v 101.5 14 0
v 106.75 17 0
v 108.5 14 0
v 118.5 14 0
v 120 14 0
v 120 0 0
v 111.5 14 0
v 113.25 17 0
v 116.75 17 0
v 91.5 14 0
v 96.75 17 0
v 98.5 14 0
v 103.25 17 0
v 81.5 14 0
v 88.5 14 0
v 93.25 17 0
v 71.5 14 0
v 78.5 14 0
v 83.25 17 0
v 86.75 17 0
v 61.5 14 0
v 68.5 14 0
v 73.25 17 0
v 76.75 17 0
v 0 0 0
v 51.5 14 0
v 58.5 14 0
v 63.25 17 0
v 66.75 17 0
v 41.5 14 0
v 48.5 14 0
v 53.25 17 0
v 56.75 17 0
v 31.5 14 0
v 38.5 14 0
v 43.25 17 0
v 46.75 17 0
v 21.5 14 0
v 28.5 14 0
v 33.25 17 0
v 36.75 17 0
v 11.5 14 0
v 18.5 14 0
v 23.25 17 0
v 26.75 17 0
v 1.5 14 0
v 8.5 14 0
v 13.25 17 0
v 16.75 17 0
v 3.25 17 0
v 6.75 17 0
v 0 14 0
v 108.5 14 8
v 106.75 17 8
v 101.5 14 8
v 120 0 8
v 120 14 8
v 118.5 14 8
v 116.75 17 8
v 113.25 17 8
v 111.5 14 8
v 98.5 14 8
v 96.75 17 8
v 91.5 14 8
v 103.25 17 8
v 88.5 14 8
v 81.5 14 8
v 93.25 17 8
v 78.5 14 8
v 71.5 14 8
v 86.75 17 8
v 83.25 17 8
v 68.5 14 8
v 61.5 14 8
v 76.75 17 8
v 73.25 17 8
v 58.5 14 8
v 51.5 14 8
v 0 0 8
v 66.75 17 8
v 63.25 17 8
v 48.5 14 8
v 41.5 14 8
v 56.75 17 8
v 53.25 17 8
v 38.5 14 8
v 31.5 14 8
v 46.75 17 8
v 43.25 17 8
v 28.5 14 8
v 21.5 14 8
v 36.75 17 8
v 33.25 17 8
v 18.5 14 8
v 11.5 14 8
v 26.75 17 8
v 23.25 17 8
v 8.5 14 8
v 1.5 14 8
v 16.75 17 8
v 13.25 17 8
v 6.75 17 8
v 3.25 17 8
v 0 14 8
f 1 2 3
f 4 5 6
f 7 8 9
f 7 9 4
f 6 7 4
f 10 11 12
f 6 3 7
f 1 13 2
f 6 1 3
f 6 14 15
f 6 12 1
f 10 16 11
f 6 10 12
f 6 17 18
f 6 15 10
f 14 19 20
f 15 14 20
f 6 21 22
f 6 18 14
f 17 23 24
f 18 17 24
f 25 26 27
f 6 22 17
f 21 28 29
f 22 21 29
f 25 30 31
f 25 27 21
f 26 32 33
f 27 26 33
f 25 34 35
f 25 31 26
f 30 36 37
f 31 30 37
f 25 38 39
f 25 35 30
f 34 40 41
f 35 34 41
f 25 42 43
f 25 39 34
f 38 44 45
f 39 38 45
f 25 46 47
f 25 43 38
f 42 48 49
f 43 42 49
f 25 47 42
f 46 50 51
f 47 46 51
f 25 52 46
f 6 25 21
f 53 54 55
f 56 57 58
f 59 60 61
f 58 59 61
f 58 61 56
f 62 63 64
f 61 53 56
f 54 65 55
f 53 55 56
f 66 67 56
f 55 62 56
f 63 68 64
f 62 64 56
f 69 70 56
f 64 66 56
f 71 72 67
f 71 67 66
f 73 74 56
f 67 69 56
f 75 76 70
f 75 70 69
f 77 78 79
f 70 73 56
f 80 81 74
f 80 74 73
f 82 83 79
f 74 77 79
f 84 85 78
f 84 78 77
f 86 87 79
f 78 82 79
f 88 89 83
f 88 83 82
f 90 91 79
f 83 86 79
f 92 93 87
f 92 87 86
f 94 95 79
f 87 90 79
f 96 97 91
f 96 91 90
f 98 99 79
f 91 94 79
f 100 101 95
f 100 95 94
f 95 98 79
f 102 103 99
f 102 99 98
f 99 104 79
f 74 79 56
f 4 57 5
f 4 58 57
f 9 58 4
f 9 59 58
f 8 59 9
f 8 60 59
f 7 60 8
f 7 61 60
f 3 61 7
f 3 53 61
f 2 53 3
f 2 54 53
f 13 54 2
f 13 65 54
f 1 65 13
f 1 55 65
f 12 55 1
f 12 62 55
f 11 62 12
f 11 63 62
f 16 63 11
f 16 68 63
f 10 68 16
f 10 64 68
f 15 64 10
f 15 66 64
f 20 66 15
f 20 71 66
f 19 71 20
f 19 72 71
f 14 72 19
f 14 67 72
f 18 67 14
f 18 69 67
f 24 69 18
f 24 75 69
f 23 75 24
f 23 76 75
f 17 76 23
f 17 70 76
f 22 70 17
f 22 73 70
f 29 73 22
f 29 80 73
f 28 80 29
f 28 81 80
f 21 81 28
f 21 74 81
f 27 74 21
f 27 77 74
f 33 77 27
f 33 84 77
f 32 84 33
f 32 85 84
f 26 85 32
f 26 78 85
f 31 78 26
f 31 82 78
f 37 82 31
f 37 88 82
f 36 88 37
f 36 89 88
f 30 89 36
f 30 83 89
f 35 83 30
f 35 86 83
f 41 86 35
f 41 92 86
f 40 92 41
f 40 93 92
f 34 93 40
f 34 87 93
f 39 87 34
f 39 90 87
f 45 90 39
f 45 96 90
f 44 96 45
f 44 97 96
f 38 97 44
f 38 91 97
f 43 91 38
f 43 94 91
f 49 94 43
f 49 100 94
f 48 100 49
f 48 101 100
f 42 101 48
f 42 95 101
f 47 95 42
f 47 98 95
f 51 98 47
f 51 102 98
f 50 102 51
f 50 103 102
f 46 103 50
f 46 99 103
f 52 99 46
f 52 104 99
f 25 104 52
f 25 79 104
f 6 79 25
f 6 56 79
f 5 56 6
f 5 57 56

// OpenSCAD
$fn = 32;

// ----------------------------------------------------------------------
// Gear rack: 12 teeth, pitch 10 mm
// ----------------------------------------------------------------------

// --- parameters (mm) ---
teeth = 12;               // number of teeth
pitch = 10;               // tooth pitch, X
root_w = 7;               // tooth width at the root
tip_w = 3.5;              // tooth width at the tip
base_h = 14;              // rack body height, Y
tooth_h = 3;              // tooth height above the body
plate_t = 8;              // rack width, Z (extrusion height)
fit_tol = 0.05;           // declared fit tolerance (prompt contract)
free_tol = 0.2;           // declared free tolerance (prompt contract)

rack_l = teeth * pitch;  // overall length
total_h = base_h + tooth_h;  // overall height

profile = [[0, 0], [120, 0], [120, 14], [118.5, 14], [116.75, 17], [113.25, 17], [111.5, 14], [108.5, 14], [106.75, 17], [103.25, 17], [101.5, 14], [98.5, 14], [96.75, 17], [93.25, 17], [91.5, 14], [88.5, 14], [86.75, 17], [83.25, 17], [81.5, 14], [78.5, 14], [76.75, 17], [73.25, 17], [71.5, 14], [68.5, 14], [66.75, 17], [63.25, 17], [61.5, 14], [58.5, 14], [56.75, 17], [53.25, 17], [51.5, 14], [48.5, 14], [46.75, 17], [43.25, 17], [41.5, 14], [38.5, 14], [36.75, 17], [33.25, 17], [31.5, 14], [28.5, 14], [26.75, 17], [23.25, 17], [21.5, 14], [18.5, 14], [16.75, 17], [13.25, 17], [11.5, 14], [8.5, 14], [6.75, 17], [3.25, 17], [1.5, 14], [0, 14]];  // primary outline, 52 points, counter clockwise

// --- the one profile operation ---
linear_extrude(height = plate_t) polygon(points = profile);
